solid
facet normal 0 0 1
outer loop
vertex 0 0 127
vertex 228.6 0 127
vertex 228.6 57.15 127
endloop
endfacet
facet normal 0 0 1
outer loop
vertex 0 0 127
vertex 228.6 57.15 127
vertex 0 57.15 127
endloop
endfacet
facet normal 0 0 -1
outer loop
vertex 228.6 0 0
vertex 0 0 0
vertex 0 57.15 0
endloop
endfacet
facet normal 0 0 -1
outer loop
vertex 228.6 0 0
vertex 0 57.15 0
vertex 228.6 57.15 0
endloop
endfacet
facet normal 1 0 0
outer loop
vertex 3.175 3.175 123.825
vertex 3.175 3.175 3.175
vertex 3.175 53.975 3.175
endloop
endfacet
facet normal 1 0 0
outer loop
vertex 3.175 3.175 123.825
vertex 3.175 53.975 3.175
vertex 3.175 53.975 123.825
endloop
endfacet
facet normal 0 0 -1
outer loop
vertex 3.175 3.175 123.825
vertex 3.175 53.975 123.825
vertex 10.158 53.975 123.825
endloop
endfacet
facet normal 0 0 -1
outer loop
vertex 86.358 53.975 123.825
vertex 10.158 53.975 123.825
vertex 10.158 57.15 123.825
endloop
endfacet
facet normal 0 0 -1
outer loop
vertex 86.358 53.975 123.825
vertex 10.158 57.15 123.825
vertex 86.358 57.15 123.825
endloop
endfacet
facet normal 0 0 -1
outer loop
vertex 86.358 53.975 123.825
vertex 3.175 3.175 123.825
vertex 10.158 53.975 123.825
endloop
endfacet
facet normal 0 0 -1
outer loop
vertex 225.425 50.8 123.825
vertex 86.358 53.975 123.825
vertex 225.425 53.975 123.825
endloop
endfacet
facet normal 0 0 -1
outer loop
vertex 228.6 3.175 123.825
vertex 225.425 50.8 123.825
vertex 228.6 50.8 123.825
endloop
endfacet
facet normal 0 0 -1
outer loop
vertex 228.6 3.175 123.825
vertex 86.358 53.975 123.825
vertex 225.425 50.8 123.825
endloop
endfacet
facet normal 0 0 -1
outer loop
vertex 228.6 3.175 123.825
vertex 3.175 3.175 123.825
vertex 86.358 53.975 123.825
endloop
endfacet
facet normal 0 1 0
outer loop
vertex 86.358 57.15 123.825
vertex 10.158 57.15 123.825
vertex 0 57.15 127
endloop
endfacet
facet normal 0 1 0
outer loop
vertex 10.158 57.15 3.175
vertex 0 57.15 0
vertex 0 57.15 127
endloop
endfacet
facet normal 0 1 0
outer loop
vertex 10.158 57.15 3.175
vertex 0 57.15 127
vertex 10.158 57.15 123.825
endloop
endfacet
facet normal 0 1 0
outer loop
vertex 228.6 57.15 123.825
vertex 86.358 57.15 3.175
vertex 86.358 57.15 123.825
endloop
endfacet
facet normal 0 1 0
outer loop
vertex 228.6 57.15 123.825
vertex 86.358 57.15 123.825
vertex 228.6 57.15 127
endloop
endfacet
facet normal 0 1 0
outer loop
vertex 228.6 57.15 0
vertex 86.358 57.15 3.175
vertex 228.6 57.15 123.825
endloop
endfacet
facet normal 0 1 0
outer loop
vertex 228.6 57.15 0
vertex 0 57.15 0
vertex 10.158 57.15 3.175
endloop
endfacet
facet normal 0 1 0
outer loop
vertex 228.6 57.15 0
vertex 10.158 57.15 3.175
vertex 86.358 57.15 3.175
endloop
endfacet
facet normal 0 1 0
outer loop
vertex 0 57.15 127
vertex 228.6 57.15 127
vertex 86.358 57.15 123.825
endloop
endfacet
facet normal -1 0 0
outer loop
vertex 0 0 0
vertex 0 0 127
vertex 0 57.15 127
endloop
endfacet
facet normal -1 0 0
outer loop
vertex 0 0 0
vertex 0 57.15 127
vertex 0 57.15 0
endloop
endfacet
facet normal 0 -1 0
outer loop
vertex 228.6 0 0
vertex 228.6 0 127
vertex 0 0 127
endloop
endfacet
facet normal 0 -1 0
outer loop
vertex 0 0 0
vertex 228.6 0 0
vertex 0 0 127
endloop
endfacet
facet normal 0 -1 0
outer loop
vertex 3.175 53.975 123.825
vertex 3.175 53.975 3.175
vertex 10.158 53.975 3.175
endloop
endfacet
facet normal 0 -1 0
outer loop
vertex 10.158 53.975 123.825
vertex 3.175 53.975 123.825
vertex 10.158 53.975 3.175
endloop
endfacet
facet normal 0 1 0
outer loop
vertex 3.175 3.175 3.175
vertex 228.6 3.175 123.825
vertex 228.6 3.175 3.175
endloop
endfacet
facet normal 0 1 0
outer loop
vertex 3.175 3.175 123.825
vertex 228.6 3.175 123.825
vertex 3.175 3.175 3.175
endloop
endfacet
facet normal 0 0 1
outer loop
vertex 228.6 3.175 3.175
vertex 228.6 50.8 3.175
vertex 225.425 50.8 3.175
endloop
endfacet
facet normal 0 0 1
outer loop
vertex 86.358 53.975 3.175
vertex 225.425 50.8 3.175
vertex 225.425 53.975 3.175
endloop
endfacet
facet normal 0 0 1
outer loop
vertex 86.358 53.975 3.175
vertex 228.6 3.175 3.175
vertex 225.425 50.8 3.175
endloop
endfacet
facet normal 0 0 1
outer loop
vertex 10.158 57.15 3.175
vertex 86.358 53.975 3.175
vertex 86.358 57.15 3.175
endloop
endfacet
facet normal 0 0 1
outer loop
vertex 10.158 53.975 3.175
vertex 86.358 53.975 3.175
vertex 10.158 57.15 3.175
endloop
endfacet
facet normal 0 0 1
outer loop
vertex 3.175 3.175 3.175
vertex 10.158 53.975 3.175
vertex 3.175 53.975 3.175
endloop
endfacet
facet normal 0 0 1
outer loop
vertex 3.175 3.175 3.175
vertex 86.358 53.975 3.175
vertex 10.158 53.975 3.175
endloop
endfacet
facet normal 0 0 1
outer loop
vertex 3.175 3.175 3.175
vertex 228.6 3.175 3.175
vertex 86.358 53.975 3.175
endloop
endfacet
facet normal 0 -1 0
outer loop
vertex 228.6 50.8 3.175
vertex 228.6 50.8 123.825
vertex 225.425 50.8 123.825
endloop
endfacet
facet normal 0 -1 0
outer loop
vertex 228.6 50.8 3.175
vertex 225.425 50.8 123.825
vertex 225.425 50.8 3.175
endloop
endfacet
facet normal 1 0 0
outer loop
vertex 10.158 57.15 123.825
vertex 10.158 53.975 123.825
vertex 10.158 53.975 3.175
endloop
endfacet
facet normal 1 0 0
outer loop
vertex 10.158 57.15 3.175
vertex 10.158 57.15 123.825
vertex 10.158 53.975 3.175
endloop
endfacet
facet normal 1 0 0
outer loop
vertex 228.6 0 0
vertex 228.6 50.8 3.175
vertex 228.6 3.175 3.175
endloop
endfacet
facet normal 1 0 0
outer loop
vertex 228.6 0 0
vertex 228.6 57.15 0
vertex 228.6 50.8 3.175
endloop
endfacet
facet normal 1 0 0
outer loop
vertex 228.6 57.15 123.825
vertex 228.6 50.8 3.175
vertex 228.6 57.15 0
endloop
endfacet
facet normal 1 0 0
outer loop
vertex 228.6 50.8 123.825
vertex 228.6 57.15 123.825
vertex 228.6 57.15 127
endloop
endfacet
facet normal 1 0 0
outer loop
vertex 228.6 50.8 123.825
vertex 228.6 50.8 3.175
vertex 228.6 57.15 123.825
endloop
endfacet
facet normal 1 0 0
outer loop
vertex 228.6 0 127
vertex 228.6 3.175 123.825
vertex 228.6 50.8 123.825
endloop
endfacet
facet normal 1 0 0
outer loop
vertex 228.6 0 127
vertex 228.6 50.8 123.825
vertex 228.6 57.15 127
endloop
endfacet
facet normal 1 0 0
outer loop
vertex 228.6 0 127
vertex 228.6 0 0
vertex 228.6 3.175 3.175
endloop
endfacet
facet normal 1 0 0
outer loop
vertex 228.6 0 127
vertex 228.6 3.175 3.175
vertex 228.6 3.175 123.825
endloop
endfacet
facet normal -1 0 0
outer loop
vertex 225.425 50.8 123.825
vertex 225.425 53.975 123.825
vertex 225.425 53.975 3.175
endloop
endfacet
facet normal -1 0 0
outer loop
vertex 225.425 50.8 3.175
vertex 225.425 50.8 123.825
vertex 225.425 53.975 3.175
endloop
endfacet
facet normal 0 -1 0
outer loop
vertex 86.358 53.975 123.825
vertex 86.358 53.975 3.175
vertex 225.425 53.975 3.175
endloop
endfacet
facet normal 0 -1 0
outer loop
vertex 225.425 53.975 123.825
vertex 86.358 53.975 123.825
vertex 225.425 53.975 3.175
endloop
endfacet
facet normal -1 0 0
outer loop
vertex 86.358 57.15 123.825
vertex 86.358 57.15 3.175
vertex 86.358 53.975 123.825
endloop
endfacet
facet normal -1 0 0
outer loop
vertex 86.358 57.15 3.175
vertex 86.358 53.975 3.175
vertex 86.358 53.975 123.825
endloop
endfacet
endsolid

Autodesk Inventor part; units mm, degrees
ref_plane "YZ Plane" through (0, 0, 0) normal (1, 0, 0) x (0, 1, 0)
ref_plane "XZ Plane" through (0, 0, 0) normal (0, 1, 0) x (-1, 0, 0)
ref_plane "XY Plane" through (0, 0, 0) normal (0, 0, 1) x (1, 0, 0)
sketch "Sketch1" plane through (0, 0, 0) normal (0, 1, 0) x (-1, 0, 0)
  line L0 (0, 0) -> (-228.6, 0)
  line L1 (-228.6, 0) -> (-228.6, 127)
  line L2 (-228.6, 127) -> (0, 127)
  line L3 (0, 127) -> (0, 0)
  dimension "d0" = 228.6
  dimension "d1" = 127
extrude "Extrusion1" add sketch "Sketch1" along normal blind 3.175
sketch "Sketch2" plane through (0, 3.175, 0) normal (0, 1, 0) x (1, 0, 0)
  line L0 (228.6, 0) -> (0, 0) projected
  line L1 (0, -127) -> (228.6, -127) projected
  line L2 (0, 0) -> (228.6, 0)
  line L3 (228.6, -127) -> (0, -127)
  line L4 (0, -127) -> (0, 0)
  line L5 (0, 0) -> (0, -127) projected
  line L6 (0, 0) -> (228.6, 0)
  line L7 (228.6, 0) -> (228.6, -127)
  line L8 (228.6, -127) -> (0, -127)
  line L9 (0, -127) -> (0, 0)
  line L10 (228.6, -3.175) -> (3.175, -3.175)
  line L11 (3.175, -3.175) -> (3.175, -123.825)
  line L12 (3.175, -123.825) -> (228.6, -123.825)
  dimension "d4" = 3.175
extrude "Extrusion2" add sketch "Sketch2" along normal blind 50.8 contours L7 L10 L11 L12 L1 L4 L0
sketch "Sketch3" plane through (228.6, 0, 127) normal (1, 0, 0) x (0, 0, -1)
  line L0 (127, 53.975) -> (0, 53.975) projected
  line L1 (0, 53.975) -> (127, 53.975)
  line L2 (127, 53.975) -> (127, 0)
  line L3 (127, 0) -> (0, 0)
  line L4 (0, 0) -> (0, 53.975)
  line L5 (3.175, 50.8) -> (123.825, 50.8)
  line L6 (123.825, 50.8) -> (123.825, 3.175)
  line L7 (123.825, 3.175) -> (3.175, 3.175)
  line L8 (3.175, 3.175) -> (3.175, 50.8)
  dimension "d7" = 3.175
extrude "Extrusion3" add sketch "Sketch3" against normal blind 3.175
sketch "Sketch4" plane through (0, 53.975, 0) normal (0, 1, 0) x (1, 0, 0)
  line L0 (228.6, 0) -> (0, 0) projected
  line L1 (0, -127) -> (228.6, -127) projected
  line L2 (0, 0) -> (228.6, 0)
  line L3 (228.6, 0) -> (228.6, -127)
  line L4 (228.6, -127) -> (0, -127)
  line L5 (0, -127) -> (0, 0)
  line L6 (3.175, -123.825) -> (228.6, -123.825) construction
  line L7 (3.175, -123.825) -> (79.375, -123.825) construction
  line L8 (228.6, -127) -> (228.6, 0) projected
  line L9 (79.375, -123.825) -> (228.6, -123.825)
  line L10 (228.6, -123.825) -> (228.6, 0)
  line L11 (228.6, 0) -> (79.375, 0)
  line L12 (3.175, -123.825) -> (3.175, -3.175) projected
  line L13 (3.175, -3.175) -> (79.375, -3.175)
  line L14 (79.375, -123.825) -> (3.175, -123.825)
  line L15 (3.175, -123.825) -> (3.175, -3.175)
  line L16 (79.375, -3.175) -> (155.575, -3.175)
  line L17 (155.575, -123.825) -> (79.375, -123.825)
  line L18 (3.175, -123.825) -> (117.475, -123.825) construction
  line L19 (225.425, -123.825) -> (3.175, -123.825) construction
  line L20 (117.475, -123.825) -> (41.275, -123.825)
  line L21 (41.275, -3.175) -> (117.475, -3.175)
  line L22 (3.175, -3.175) -> (225.425, -3.175) projected
  line L23 (10.1575, -3.175) -> (86.3575, -3.175)
  line L24 (86.3575, -3.175) -> (86.3575, -123.825)
  line L25 (86.3575, -123.825) -> (10.1575, -123.825)
  line L26 (10.1575, -123.825) -> (10.1575, -3.175)
  point P0 (10.1575, -123.825)
  dimension "d10" = 76.2
  dimension "d13" = 76.2
  dimension "d15" = 114.3
  dimension "d16" = 76.2
  dimension "d17" = 76.2
extrude "Extrusion4" add sketch "Sketch4" along normal blind 3.175 contours L3 L1 L5 L0 | L14 L12 L13 L26
properties part number "ShootingMech_Housing3"
